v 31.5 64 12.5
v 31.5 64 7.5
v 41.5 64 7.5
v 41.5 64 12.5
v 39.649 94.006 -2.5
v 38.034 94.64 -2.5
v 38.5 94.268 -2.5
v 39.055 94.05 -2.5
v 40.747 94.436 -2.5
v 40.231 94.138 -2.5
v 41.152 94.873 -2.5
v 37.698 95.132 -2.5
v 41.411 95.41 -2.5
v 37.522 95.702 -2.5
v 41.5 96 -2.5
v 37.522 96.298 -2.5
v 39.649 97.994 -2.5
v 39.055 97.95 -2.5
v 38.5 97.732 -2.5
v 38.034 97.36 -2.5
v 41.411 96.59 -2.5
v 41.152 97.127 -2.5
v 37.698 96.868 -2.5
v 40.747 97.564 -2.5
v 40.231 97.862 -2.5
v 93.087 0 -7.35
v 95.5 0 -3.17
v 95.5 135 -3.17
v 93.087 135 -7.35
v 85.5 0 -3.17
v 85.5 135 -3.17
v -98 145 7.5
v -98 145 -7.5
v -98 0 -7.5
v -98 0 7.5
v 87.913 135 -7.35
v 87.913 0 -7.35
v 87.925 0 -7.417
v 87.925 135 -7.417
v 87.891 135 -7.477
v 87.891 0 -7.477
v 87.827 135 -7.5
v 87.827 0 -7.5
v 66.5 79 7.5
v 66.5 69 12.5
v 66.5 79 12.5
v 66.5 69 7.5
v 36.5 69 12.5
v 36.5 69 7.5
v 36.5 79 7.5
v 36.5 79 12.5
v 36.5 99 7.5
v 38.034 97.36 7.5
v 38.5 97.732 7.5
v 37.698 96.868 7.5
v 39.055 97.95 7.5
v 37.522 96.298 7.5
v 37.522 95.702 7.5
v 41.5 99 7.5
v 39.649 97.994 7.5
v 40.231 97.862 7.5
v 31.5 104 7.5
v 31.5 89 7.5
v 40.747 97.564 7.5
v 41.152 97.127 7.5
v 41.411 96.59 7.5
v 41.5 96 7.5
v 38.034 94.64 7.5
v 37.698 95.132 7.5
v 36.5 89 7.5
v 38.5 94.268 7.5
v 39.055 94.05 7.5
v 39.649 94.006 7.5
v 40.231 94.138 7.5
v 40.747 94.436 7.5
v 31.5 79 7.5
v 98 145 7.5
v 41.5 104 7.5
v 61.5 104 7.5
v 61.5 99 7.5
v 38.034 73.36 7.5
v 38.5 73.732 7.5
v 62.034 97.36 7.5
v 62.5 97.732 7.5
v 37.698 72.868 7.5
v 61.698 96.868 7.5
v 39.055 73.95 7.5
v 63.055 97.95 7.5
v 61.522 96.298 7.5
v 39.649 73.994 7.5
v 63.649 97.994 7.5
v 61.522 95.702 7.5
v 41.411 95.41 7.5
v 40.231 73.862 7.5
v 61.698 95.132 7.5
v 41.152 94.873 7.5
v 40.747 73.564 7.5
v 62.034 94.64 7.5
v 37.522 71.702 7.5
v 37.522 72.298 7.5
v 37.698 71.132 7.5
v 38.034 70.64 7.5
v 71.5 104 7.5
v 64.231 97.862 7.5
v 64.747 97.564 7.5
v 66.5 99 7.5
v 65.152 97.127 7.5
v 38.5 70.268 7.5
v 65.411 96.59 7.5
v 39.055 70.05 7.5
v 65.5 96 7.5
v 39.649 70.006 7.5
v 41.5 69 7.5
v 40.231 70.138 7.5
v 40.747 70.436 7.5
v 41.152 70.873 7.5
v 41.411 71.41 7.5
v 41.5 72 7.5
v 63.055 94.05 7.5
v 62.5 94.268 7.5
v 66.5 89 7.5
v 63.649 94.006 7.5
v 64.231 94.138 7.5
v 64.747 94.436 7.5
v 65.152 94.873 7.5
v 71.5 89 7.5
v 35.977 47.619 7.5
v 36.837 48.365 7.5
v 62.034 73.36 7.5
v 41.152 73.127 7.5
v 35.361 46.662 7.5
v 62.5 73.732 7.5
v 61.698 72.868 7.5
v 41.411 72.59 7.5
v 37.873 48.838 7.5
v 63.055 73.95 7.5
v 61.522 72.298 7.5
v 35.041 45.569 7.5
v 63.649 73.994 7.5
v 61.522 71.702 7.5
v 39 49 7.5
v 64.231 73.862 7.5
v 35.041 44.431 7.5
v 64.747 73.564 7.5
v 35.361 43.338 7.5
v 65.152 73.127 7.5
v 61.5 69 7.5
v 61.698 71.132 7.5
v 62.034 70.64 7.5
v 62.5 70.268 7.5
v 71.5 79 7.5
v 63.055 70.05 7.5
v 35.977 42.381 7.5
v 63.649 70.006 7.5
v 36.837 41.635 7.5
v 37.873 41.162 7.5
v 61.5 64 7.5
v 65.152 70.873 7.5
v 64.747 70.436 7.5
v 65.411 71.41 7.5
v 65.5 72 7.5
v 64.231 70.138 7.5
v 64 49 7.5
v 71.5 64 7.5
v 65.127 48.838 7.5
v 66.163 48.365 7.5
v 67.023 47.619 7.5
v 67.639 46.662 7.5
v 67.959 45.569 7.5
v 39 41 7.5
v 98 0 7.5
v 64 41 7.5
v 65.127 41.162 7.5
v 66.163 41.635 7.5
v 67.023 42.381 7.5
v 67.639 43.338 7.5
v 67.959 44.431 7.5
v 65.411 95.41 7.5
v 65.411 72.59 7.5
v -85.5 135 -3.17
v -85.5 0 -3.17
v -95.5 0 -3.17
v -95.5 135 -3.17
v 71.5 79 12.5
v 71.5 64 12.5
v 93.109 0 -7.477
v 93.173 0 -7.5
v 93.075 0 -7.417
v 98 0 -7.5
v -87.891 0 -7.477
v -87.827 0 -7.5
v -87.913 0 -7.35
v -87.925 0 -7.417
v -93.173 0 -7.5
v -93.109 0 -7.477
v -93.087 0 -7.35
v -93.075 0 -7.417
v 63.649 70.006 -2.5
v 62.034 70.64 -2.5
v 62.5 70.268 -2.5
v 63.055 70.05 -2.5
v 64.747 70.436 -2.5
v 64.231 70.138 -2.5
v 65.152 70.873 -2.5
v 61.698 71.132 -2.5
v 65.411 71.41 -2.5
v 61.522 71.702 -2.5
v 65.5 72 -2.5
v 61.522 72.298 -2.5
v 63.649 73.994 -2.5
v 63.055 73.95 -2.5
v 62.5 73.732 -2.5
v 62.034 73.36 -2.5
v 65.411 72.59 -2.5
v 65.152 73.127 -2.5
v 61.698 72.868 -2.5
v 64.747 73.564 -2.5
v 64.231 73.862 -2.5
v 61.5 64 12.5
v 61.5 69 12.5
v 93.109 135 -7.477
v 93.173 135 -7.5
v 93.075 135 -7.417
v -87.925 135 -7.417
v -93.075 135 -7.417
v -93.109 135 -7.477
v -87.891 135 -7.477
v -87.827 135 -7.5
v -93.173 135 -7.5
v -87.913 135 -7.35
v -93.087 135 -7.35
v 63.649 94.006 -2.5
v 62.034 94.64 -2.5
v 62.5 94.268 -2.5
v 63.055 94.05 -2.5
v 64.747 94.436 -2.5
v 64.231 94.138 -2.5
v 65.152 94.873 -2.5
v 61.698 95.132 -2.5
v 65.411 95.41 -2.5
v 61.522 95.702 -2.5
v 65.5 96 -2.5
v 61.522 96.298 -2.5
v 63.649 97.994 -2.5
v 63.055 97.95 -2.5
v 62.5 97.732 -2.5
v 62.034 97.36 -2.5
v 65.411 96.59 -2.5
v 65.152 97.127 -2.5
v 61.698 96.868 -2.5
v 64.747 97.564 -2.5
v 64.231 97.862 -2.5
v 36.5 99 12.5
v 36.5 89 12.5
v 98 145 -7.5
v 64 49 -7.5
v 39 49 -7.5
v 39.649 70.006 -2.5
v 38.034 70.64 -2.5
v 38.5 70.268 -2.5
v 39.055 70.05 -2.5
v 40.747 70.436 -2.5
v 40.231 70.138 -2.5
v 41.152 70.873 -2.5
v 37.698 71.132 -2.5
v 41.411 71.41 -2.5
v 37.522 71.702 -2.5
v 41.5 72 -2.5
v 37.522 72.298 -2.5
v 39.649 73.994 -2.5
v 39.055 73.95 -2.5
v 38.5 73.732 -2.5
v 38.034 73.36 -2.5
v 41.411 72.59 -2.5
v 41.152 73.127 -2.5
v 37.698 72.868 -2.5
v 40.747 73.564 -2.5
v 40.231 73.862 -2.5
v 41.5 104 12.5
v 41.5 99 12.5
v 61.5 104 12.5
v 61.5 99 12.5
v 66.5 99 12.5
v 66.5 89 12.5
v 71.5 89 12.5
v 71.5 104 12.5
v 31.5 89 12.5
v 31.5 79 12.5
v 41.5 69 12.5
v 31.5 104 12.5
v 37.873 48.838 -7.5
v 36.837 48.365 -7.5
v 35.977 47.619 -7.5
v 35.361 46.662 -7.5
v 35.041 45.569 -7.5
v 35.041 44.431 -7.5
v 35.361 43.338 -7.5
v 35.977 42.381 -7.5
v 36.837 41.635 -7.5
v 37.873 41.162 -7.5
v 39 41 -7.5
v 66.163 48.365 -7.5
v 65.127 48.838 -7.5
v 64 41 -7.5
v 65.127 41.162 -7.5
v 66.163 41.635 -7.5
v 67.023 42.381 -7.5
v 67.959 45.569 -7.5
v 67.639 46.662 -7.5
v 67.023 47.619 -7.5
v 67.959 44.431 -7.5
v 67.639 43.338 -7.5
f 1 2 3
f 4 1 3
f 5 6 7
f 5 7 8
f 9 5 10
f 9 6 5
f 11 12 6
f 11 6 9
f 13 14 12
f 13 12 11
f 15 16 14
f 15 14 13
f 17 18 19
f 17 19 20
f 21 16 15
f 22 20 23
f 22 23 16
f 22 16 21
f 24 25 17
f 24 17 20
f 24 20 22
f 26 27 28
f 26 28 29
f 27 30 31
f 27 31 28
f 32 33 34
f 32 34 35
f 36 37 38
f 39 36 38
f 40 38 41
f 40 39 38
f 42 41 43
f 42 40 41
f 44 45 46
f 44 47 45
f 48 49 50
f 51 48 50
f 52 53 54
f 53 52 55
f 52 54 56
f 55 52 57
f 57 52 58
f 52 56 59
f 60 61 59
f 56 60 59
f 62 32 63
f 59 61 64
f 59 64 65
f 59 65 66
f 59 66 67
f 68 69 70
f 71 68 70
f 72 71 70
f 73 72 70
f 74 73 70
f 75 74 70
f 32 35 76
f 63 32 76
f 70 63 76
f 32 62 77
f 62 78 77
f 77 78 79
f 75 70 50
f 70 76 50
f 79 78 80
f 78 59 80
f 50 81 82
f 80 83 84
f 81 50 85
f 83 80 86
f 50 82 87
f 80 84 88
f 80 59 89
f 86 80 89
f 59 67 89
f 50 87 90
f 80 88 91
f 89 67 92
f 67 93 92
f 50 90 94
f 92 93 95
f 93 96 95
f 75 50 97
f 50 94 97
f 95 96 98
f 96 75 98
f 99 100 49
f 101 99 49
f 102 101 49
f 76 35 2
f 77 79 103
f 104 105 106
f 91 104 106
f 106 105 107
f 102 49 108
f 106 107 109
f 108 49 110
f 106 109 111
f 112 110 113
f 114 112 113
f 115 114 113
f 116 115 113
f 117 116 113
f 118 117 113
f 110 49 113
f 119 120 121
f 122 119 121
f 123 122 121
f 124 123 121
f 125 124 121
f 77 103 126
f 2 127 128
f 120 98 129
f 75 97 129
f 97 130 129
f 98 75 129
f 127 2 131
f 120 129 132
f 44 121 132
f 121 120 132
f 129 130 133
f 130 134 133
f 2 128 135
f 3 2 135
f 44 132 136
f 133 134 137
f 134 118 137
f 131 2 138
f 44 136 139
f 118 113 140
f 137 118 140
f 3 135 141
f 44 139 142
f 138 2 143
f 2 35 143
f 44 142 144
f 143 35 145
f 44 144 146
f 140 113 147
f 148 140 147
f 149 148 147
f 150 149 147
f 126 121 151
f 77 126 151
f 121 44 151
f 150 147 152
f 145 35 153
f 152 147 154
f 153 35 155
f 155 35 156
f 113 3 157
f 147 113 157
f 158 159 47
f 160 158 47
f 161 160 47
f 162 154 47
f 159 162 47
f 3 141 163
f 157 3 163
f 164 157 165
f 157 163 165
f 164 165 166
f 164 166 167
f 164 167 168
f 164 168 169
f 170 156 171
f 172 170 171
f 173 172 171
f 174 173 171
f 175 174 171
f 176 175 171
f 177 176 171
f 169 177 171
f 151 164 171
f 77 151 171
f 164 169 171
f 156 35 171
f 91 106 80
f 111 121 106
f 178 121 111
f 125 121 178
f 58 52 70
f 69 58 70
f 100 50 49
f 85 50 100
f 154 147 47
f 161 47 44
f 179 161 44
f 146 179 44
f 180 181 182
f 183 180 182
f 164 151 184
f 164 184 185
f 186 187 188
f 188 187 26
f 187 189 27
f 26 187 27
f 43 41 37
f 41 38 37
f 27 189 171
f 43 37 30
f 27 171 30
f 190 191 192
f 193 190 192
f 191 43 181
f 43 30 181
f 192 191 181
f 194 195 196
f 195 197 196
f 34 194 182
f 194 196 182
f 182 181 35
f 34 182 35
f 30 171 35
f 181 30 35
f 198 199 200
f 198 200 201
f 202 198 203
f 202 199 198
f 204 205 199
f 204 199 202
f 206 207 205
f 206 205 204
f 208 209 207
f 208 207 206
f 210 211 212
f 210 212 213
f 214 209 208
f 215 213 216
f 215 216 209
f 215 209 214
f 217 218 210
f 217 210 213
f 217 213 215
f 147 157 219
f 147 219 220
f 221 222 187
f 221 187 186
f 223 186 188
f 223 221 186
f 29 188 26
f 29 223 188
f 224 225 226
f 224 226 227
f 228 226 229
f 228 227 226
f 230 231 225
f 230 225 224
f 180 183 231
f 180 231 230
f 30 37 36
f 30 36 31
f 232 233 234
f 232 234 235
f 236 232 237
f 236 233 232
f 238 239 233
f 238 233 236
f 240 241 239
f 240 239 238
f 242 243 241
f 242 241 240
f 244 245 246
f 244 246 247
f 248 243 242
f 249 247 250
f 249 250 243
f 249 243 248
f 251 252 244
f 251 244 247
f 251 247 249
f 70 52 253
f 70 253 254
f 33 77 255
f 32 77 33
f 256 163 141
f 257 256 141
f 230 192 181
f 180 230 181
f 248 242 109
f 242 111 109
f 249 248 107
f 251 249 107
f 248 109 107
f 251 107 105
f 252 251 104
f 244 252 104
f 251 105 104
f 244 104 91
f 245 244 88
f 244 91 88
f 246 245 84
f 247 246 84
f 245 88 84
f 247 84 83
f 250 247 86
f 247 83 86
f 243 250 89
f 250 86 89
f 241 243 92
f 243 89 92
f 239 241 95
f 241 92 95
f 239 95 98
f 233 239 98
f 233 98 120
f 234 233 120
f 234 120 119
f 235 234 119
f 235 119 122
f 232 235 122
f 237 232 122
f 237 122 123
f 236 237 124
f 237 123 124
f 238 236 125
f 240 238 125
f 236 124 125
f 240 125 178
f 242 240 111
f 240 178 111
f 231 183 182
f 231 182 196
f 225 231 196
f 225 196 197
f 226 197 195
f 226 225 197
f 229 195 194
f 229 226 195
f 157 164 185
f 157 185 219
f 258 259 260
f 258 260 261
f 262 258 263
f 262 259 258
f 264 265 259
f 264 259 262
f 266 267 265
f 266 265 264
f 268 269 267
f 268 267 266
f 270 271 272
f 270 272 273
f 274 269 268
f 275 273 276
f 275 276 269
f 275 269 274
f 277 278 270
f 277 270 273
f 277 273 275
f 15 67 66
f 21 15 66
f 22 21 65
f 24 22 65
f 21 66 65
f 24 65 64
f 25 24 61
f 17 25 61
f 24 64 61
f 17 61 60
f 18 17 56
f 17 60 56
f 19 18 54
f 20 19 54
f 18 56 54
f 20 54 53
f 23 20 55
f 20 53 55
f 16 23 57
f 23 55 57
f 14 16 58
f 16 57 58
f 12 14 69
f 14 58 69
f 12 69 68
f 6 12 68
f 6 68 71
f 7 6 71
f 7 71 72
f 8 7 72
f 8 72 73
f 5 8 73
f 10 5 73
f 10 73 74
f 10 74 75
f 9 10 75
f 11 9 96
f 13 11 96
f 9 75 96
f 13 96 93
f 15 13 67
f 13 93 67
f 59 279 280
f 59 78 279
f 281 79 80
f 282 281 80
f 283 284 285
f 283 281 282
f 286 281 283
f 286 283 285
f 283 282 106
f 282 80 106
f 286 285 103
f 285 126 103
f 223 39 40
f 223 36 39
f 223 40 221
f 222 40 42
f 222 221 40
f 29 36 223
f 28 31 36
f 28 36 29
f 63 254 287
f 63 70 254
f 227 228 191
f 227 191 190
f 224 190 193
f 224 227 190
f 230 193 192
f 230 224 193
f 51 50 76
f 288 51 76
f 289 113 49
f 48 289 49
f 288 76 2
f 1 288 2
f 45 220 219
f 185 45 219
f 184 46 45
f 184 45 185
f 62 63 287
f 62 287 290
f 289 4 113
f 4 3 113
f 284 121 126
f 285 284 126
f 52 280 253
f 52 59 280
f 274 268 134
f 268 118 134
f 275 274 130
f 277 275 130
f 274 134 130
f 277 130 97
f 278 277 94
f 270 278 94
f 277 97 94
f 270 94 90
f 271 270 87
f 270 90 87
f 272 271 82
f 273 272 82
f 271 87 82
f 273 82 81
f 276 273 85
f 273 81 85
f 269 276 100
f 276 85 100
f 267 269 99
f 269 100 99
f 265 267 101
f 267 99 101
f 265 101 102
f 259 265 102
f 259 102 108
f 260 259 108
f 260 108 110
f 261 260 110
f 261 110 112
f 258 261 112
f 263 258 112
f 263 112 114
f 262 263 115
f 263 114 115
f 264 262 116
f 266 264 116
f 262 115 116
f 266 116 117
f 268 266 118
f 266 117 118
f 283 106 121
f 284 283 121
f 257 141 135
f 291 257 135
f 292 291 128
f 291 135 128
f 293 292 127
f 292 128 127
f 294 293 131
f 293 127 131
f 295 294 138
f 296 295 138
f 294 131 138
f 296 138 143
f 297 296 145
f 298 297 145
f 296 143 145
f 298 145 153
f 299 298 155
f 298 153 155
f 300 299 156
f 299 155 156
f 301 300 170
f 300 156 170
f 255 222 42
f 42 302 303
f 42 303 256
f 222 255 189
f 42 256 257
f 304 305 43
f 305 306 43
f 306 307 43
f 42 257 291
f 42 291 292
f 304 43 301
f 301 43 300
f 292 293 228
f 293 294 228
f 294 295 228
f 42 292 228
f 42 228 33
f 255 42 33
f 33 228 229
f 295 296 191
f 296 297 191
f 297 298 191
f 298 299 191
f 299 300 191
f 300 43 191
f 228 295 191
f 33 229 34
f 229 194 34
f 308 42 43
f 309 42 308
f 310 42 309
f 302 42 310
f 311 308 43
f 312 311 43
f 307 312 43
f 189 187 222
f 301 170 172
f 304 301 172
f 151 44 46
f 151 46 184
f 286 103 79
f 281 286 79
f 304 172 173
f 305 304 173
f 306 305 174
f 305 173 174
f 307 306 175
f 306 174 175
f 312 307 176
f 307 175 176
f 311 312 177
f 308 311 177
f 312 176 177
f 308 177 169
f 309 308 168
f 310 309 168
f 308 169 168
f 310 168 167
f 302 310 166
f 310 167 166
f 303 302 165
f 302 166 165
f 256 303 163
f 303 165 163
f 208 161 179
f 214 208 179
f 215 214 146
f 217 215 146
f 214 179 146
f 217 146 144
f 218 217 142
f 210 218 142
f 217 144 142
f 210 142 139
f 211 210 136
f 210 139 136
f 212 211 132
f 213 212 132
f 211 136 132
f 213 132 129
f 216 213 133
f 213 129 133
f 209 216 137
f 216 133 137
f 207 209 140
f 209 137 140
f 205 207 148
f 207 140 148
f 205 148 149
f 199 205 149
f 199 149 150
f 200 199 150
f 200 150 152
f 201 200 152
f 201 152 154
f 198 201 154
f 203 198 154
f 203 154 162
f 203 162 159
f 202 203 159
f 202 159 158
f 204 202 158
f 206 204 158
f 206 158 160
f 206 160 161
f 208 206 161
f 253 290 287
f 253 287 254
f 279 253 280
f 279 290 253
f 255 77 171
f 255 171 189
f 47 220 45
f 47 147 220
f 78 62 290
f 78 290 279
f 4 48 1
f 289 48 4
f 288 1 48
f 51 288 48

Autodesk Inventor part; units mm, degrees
ref_plane "YZ Plane" through (0, 0, 0) normal (1, 0, 0) x (0, 1, 0)
ref_plane "XZ Plane" through (0, 0, 0) normal (0, 1, 0) x (-1, 0, 0)
ref_plane "XY Plane" through (0, 0, 0) normal (0, 0, 1) x (1, 0, 0)
sketch "Boceto1" plane through (0, 0, 0) normal (0, 1, 0) x (-1, 0, 0)
  line L0 (-98, -7.5) -> (98, -7.5)
  line L1 (98, -7.5) -> (98, 7.5)
  line L2 (98, 7.5) -> (-98, 7.5)
  line L3 (-98, 7.5) -> (-98, -7.5)
  line L4 (-98, -7.5) -> (98, 7.5) construction
  line L5 (98, -7.5) -> (-98, 7.5) construction
  point P0 (0, 0)
  dimension "d0" = 196
  dimension "d1" = 15
extrude "Extrusión1" add sketch "Boceto1" along normal blind 145
sketch "Boceto3" plane through (0, 0, 0) normal (0, -1, 0) x (1, 0, 0)
  line L0 (-98, -7.5) -> (-98, 7.5) projected
  line L1 (-98, -7.5) -> (-98, 7.5) projected
  line L2 (-98, 7.5) -> (98, 7.5) projected
  line L3 (-98, 7.5) -> (98, 7.5) projected
  line L4 (98, 7.5) -> (98, -7.5) projected
  line L5 (98, 7.5) -> (98, -7.5) projected
  line L6 (98, -7.5) -> (-98, -7.5) projected
  line L7 (98, -7.5) -> (-98, -7.5) projected
  line L8 (-98, -7.5) -> (-98, 7.5) projected
  line L9 (98, -7.5) -> (-98, -7.5) projected
  line L10 (98, 7.5) -> (98, -7.5) projected
  line L11 (-98, 7.5) -> (98, 7.5) projected
  line L12 (-98, -7.5) -> (-98, 7.5) projected
  line L13 (-98, 7.5) -> (98, 7.5) projected
  line L14 (98, 7.5) -> (98, -7.5) projected
  line L15 (98, -7.5) -> (-98, -7.5) projected
  line L16 (-98, -7.5) -> (-98, 7.5) projected
  line L17 (-98, -7.5) -> (-98, 7.5) projected
  line L18 (-98, 7.5) -> (98, 7.5) projected
  line L19 (-98, 7.5) -> (98, 7.5) projected
  line L20 (98, 7.5) -> (98, -7.5) projected
  line L21 (98, 7.5) -> (98, -7.5) projected
  line L22 (98, -7.5) -> (-98, -7.5) projected
  line L23 (98, -7.5) -> (-98, -7.5) projected
  line L24 (98, -7.5) -> (-98, -7.5) projected
  line L25 (-98, -7.5) -> (-98, 7.5) projected
  line L26 (-98, 7.5) -> (98, 7.5) projected
  line L27 (98, 7.5) -> (98, -7.5) projected
  line L28 (98, -7.5) -> (-98, 7.5) construction
  line L29 (-98, -7.5) -> (98, 7.5) construction
  line L30 (90.5, 7.5) -> (90.5, -7.5) construction
  line L31 (88, -7.5) -> (93, -7.5)
  line L32 (88, -7.5) -> (85.5, -3.1699)
  line L33 (85.5, -3.1699) -> (95.5, -3.1699)
  line L34 (95.5, -3.1699) -> (93, -7.5)
  line L35 (0, 7.5) -> (0, -7.5) construction
  line L36 (-88, -7.5) -> (-85.5, -3.1699)
  line L37 (-85.5, -3.1699) -> (-95.5, -3.1699)
  line L38 (-95.5, -3.1699) -> (-93, -7.5)
  point P0 (0, 0)
  point P1 (0, 0)
  point P2 (98, 0)
  dimension "d8" = 7.5
  dimension "d9" = 5
  dimension "d10" = 10
  dimension "d12" = 60
extrude "Extrusión2" cut sketch "Boceto3" against normal blind 135 contours L38 L37 L36 L6 | L32 L33 L34 L6
sketch "Boceto4" plane through (-98, 0, 7.5) normal (0, 0, 1) x (1, 0, 0)
  line L0 (0, 0) -> (0, 145) projected
  line L1 (0, 45) -> (196, 45) construction
  line L2 (196, 0) -> (196, 145) projected
  line L3 (0, 0) -> (196, 0) projected
  line L4 (162, 45) -> (137, 45) construction
  line L5 (162, 49) -> (137, 49)
  line L6 (137, 41) -> (162, 41)
  arc A0 (162, 41) -> (162, 49) centre (162, 45) ccw
  arc A1 (137, 49) -> (137, 41) centre (137, 45) ccw
  line L7 (149.5, 45) -> (149.5, 84) construction
  line L8 (164.5, 69) -> (134.5, 69) construction
  line L9 (134.5, 69) -> (134.5, 99) construction
  line L10 (134.5, 99) -> (164.5, 99) construction
  line L11 (164.5, 99) -> (164.5, 69) construction
  line L12 (164.5, 69) -> (134.5, 99) construction
  line L13 (134.5, 69) -> (164.5, 99) construction
  line L14 (137.5, 72) -> (161.5, 72) construction
  line L15 (161.5, 72) -> (161.5, 96) construction
  line L16 (161.5, 96) -> (137.5, 96) construction
  line L17 (137.5, 96) -> (137.5, 72) construction
  circle A2 centre (161.5, 96) radius 2
  circle A3 centre (137.5, 96) radius 2
  circle A4 centre (161.5, 72) radius 2
  circle A5 centre (137.5, 72) radius 2
  line L18 (134.5, 69) -> (134.5, 79)
  line L19 (134.5, 79) -> (129.5, 79)
  line L20 (129.5, 79) -> (129.5, 64)
  line L21 (129.5, 64) -> (139.5, 64)
  line L22 (139.5, 64) -> (139.5, 69)
  line L23 (139.5, 69) -> (134.5, 69)
  line L24 (149.5, 84) -> (134.5, 84) construction
  line L25 (134.5, 99) -> (134.5, 89)
  line L26 (134.5, 89) -> (129.5, 89)
  line L27 (129.5, 89) -> (129.5, 104)
  line L28 (129.5, 104) -> (139.5, 104)
  line L29 (139.5, 104) -> (139.5, 99)
  line L30 (139.5, 99) -> (134.5, 99)
  line L31 (164.5, 69) -> (164.5, 79)
  line L32 (164.5, 79) -> (169.5, 79)
  line L33 (169.5, 79) -> (169.5, 64)
  line L34 (169.5, 64) -> (159.5, 64)
  line L35 (159.5, 64) -> (159.5, 69)
  line L36 (159.5, 69) -> (164.5, 69)
  line L37 (164.5, 89) -> (169.5, 89)
  line L38 (169.5, 89) -> (169.5, 104)
  line L39 (164.5, 99) -> (164.5, 89)
  line L40 (169.5, 104) -> (159.5, 104)
  line L41 (159.5, 104) -> (159.5, 99)
  line L42 (159.5, 99) -> (164.5, 99)
  point P0 (98, 0)
  point P1 (166, 45)
  dimension "d15" = 45
  dimension "d16" = 8
  dimension "d17" = 25
  dimension "d18" = 30
  dimension "d22" = 39
  dimension "d23" = 30
  dimension "d24" = 30
  dimension "d25" = 3
  dimension "d27" = 4
  dimension "d28" = 4
  dimension "d29" = 4
  dimension "d30" = 4
  dimension "d31" = 10
  dimension "d32" = 5
  dimension "d33" = 5
  dimension "d34" = 5
extrude "Extrusión3" cut sketch "Boceto4" against normal through all contours A0 L6 A1 L5
fillet "Empalme1" radius 0.1 4 edges at (93, 67.5, -7.5) (88, 67.5, -7.5) (-88, 67.5, -7.5) (-93, 67.5, -7.5)
extrude "Extrusión4" cut sketch "Boceto4" against normal blind 10 contours A2 | A3 | A4 | A5
extrude "Extrusión5" add sketch "Boceto4" along normal blind 5 contours L23 L22 L21 L20 L19 L18 | L25 L26 L27 L28 L29 L30 | L31 L32 L33 L34 L35 L36 | L39 L42 L41 L40 L38 L37
equation "\"d27\" = d28"
equation "\"d29\" = d28"
equation "\"d30\" = d28"
properties part number "Tapa_frontal"
